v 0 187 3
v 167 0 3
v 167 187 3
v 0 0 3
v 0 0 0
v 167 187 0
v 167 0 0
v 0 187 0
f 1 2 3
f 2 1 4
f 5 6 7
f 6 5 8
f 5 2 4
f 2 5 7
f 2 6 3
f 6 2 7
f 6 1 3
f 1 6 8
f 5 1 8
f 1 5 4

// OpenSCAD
//for apporopriate alignment of the grid
xoff = 17;
yoff = 17;
zoff = 2;
plat = 167;
scaleFac = 25.4;

//remove excess grid/plot
difference() {
	//align and union the grid and plot
	translate(v = [xoff, yoff, zoff]) { 
		union() {
			linear_extrude(file = "cleanGrid1.dxf", height = 3, center = false);
			linear_extrude(file = "newgridnum.dxf", height = 5, center = false);
			linear_extrude(file = "DataAQuad.dxf", height = 5, center = false);
			linear_extrude(file = "DataBQuad.dxf", height = 7, center = false);
		}
	}

	//blocks to remove excess
	union() {
		translate(v=[-20,-10,0]) cube(size = [20,170,10], center=false);
		translate(v=[0,-20,0]) cube(size = [170,20,10], center=false);
	}
}
	

//grid platform
cube(size = [plat,plat+20,3], center = false);
translate(v=[plat/2,plat+8,zoff]) linear_extrude(file = "one.dxf", height = 5 , center = false);		
